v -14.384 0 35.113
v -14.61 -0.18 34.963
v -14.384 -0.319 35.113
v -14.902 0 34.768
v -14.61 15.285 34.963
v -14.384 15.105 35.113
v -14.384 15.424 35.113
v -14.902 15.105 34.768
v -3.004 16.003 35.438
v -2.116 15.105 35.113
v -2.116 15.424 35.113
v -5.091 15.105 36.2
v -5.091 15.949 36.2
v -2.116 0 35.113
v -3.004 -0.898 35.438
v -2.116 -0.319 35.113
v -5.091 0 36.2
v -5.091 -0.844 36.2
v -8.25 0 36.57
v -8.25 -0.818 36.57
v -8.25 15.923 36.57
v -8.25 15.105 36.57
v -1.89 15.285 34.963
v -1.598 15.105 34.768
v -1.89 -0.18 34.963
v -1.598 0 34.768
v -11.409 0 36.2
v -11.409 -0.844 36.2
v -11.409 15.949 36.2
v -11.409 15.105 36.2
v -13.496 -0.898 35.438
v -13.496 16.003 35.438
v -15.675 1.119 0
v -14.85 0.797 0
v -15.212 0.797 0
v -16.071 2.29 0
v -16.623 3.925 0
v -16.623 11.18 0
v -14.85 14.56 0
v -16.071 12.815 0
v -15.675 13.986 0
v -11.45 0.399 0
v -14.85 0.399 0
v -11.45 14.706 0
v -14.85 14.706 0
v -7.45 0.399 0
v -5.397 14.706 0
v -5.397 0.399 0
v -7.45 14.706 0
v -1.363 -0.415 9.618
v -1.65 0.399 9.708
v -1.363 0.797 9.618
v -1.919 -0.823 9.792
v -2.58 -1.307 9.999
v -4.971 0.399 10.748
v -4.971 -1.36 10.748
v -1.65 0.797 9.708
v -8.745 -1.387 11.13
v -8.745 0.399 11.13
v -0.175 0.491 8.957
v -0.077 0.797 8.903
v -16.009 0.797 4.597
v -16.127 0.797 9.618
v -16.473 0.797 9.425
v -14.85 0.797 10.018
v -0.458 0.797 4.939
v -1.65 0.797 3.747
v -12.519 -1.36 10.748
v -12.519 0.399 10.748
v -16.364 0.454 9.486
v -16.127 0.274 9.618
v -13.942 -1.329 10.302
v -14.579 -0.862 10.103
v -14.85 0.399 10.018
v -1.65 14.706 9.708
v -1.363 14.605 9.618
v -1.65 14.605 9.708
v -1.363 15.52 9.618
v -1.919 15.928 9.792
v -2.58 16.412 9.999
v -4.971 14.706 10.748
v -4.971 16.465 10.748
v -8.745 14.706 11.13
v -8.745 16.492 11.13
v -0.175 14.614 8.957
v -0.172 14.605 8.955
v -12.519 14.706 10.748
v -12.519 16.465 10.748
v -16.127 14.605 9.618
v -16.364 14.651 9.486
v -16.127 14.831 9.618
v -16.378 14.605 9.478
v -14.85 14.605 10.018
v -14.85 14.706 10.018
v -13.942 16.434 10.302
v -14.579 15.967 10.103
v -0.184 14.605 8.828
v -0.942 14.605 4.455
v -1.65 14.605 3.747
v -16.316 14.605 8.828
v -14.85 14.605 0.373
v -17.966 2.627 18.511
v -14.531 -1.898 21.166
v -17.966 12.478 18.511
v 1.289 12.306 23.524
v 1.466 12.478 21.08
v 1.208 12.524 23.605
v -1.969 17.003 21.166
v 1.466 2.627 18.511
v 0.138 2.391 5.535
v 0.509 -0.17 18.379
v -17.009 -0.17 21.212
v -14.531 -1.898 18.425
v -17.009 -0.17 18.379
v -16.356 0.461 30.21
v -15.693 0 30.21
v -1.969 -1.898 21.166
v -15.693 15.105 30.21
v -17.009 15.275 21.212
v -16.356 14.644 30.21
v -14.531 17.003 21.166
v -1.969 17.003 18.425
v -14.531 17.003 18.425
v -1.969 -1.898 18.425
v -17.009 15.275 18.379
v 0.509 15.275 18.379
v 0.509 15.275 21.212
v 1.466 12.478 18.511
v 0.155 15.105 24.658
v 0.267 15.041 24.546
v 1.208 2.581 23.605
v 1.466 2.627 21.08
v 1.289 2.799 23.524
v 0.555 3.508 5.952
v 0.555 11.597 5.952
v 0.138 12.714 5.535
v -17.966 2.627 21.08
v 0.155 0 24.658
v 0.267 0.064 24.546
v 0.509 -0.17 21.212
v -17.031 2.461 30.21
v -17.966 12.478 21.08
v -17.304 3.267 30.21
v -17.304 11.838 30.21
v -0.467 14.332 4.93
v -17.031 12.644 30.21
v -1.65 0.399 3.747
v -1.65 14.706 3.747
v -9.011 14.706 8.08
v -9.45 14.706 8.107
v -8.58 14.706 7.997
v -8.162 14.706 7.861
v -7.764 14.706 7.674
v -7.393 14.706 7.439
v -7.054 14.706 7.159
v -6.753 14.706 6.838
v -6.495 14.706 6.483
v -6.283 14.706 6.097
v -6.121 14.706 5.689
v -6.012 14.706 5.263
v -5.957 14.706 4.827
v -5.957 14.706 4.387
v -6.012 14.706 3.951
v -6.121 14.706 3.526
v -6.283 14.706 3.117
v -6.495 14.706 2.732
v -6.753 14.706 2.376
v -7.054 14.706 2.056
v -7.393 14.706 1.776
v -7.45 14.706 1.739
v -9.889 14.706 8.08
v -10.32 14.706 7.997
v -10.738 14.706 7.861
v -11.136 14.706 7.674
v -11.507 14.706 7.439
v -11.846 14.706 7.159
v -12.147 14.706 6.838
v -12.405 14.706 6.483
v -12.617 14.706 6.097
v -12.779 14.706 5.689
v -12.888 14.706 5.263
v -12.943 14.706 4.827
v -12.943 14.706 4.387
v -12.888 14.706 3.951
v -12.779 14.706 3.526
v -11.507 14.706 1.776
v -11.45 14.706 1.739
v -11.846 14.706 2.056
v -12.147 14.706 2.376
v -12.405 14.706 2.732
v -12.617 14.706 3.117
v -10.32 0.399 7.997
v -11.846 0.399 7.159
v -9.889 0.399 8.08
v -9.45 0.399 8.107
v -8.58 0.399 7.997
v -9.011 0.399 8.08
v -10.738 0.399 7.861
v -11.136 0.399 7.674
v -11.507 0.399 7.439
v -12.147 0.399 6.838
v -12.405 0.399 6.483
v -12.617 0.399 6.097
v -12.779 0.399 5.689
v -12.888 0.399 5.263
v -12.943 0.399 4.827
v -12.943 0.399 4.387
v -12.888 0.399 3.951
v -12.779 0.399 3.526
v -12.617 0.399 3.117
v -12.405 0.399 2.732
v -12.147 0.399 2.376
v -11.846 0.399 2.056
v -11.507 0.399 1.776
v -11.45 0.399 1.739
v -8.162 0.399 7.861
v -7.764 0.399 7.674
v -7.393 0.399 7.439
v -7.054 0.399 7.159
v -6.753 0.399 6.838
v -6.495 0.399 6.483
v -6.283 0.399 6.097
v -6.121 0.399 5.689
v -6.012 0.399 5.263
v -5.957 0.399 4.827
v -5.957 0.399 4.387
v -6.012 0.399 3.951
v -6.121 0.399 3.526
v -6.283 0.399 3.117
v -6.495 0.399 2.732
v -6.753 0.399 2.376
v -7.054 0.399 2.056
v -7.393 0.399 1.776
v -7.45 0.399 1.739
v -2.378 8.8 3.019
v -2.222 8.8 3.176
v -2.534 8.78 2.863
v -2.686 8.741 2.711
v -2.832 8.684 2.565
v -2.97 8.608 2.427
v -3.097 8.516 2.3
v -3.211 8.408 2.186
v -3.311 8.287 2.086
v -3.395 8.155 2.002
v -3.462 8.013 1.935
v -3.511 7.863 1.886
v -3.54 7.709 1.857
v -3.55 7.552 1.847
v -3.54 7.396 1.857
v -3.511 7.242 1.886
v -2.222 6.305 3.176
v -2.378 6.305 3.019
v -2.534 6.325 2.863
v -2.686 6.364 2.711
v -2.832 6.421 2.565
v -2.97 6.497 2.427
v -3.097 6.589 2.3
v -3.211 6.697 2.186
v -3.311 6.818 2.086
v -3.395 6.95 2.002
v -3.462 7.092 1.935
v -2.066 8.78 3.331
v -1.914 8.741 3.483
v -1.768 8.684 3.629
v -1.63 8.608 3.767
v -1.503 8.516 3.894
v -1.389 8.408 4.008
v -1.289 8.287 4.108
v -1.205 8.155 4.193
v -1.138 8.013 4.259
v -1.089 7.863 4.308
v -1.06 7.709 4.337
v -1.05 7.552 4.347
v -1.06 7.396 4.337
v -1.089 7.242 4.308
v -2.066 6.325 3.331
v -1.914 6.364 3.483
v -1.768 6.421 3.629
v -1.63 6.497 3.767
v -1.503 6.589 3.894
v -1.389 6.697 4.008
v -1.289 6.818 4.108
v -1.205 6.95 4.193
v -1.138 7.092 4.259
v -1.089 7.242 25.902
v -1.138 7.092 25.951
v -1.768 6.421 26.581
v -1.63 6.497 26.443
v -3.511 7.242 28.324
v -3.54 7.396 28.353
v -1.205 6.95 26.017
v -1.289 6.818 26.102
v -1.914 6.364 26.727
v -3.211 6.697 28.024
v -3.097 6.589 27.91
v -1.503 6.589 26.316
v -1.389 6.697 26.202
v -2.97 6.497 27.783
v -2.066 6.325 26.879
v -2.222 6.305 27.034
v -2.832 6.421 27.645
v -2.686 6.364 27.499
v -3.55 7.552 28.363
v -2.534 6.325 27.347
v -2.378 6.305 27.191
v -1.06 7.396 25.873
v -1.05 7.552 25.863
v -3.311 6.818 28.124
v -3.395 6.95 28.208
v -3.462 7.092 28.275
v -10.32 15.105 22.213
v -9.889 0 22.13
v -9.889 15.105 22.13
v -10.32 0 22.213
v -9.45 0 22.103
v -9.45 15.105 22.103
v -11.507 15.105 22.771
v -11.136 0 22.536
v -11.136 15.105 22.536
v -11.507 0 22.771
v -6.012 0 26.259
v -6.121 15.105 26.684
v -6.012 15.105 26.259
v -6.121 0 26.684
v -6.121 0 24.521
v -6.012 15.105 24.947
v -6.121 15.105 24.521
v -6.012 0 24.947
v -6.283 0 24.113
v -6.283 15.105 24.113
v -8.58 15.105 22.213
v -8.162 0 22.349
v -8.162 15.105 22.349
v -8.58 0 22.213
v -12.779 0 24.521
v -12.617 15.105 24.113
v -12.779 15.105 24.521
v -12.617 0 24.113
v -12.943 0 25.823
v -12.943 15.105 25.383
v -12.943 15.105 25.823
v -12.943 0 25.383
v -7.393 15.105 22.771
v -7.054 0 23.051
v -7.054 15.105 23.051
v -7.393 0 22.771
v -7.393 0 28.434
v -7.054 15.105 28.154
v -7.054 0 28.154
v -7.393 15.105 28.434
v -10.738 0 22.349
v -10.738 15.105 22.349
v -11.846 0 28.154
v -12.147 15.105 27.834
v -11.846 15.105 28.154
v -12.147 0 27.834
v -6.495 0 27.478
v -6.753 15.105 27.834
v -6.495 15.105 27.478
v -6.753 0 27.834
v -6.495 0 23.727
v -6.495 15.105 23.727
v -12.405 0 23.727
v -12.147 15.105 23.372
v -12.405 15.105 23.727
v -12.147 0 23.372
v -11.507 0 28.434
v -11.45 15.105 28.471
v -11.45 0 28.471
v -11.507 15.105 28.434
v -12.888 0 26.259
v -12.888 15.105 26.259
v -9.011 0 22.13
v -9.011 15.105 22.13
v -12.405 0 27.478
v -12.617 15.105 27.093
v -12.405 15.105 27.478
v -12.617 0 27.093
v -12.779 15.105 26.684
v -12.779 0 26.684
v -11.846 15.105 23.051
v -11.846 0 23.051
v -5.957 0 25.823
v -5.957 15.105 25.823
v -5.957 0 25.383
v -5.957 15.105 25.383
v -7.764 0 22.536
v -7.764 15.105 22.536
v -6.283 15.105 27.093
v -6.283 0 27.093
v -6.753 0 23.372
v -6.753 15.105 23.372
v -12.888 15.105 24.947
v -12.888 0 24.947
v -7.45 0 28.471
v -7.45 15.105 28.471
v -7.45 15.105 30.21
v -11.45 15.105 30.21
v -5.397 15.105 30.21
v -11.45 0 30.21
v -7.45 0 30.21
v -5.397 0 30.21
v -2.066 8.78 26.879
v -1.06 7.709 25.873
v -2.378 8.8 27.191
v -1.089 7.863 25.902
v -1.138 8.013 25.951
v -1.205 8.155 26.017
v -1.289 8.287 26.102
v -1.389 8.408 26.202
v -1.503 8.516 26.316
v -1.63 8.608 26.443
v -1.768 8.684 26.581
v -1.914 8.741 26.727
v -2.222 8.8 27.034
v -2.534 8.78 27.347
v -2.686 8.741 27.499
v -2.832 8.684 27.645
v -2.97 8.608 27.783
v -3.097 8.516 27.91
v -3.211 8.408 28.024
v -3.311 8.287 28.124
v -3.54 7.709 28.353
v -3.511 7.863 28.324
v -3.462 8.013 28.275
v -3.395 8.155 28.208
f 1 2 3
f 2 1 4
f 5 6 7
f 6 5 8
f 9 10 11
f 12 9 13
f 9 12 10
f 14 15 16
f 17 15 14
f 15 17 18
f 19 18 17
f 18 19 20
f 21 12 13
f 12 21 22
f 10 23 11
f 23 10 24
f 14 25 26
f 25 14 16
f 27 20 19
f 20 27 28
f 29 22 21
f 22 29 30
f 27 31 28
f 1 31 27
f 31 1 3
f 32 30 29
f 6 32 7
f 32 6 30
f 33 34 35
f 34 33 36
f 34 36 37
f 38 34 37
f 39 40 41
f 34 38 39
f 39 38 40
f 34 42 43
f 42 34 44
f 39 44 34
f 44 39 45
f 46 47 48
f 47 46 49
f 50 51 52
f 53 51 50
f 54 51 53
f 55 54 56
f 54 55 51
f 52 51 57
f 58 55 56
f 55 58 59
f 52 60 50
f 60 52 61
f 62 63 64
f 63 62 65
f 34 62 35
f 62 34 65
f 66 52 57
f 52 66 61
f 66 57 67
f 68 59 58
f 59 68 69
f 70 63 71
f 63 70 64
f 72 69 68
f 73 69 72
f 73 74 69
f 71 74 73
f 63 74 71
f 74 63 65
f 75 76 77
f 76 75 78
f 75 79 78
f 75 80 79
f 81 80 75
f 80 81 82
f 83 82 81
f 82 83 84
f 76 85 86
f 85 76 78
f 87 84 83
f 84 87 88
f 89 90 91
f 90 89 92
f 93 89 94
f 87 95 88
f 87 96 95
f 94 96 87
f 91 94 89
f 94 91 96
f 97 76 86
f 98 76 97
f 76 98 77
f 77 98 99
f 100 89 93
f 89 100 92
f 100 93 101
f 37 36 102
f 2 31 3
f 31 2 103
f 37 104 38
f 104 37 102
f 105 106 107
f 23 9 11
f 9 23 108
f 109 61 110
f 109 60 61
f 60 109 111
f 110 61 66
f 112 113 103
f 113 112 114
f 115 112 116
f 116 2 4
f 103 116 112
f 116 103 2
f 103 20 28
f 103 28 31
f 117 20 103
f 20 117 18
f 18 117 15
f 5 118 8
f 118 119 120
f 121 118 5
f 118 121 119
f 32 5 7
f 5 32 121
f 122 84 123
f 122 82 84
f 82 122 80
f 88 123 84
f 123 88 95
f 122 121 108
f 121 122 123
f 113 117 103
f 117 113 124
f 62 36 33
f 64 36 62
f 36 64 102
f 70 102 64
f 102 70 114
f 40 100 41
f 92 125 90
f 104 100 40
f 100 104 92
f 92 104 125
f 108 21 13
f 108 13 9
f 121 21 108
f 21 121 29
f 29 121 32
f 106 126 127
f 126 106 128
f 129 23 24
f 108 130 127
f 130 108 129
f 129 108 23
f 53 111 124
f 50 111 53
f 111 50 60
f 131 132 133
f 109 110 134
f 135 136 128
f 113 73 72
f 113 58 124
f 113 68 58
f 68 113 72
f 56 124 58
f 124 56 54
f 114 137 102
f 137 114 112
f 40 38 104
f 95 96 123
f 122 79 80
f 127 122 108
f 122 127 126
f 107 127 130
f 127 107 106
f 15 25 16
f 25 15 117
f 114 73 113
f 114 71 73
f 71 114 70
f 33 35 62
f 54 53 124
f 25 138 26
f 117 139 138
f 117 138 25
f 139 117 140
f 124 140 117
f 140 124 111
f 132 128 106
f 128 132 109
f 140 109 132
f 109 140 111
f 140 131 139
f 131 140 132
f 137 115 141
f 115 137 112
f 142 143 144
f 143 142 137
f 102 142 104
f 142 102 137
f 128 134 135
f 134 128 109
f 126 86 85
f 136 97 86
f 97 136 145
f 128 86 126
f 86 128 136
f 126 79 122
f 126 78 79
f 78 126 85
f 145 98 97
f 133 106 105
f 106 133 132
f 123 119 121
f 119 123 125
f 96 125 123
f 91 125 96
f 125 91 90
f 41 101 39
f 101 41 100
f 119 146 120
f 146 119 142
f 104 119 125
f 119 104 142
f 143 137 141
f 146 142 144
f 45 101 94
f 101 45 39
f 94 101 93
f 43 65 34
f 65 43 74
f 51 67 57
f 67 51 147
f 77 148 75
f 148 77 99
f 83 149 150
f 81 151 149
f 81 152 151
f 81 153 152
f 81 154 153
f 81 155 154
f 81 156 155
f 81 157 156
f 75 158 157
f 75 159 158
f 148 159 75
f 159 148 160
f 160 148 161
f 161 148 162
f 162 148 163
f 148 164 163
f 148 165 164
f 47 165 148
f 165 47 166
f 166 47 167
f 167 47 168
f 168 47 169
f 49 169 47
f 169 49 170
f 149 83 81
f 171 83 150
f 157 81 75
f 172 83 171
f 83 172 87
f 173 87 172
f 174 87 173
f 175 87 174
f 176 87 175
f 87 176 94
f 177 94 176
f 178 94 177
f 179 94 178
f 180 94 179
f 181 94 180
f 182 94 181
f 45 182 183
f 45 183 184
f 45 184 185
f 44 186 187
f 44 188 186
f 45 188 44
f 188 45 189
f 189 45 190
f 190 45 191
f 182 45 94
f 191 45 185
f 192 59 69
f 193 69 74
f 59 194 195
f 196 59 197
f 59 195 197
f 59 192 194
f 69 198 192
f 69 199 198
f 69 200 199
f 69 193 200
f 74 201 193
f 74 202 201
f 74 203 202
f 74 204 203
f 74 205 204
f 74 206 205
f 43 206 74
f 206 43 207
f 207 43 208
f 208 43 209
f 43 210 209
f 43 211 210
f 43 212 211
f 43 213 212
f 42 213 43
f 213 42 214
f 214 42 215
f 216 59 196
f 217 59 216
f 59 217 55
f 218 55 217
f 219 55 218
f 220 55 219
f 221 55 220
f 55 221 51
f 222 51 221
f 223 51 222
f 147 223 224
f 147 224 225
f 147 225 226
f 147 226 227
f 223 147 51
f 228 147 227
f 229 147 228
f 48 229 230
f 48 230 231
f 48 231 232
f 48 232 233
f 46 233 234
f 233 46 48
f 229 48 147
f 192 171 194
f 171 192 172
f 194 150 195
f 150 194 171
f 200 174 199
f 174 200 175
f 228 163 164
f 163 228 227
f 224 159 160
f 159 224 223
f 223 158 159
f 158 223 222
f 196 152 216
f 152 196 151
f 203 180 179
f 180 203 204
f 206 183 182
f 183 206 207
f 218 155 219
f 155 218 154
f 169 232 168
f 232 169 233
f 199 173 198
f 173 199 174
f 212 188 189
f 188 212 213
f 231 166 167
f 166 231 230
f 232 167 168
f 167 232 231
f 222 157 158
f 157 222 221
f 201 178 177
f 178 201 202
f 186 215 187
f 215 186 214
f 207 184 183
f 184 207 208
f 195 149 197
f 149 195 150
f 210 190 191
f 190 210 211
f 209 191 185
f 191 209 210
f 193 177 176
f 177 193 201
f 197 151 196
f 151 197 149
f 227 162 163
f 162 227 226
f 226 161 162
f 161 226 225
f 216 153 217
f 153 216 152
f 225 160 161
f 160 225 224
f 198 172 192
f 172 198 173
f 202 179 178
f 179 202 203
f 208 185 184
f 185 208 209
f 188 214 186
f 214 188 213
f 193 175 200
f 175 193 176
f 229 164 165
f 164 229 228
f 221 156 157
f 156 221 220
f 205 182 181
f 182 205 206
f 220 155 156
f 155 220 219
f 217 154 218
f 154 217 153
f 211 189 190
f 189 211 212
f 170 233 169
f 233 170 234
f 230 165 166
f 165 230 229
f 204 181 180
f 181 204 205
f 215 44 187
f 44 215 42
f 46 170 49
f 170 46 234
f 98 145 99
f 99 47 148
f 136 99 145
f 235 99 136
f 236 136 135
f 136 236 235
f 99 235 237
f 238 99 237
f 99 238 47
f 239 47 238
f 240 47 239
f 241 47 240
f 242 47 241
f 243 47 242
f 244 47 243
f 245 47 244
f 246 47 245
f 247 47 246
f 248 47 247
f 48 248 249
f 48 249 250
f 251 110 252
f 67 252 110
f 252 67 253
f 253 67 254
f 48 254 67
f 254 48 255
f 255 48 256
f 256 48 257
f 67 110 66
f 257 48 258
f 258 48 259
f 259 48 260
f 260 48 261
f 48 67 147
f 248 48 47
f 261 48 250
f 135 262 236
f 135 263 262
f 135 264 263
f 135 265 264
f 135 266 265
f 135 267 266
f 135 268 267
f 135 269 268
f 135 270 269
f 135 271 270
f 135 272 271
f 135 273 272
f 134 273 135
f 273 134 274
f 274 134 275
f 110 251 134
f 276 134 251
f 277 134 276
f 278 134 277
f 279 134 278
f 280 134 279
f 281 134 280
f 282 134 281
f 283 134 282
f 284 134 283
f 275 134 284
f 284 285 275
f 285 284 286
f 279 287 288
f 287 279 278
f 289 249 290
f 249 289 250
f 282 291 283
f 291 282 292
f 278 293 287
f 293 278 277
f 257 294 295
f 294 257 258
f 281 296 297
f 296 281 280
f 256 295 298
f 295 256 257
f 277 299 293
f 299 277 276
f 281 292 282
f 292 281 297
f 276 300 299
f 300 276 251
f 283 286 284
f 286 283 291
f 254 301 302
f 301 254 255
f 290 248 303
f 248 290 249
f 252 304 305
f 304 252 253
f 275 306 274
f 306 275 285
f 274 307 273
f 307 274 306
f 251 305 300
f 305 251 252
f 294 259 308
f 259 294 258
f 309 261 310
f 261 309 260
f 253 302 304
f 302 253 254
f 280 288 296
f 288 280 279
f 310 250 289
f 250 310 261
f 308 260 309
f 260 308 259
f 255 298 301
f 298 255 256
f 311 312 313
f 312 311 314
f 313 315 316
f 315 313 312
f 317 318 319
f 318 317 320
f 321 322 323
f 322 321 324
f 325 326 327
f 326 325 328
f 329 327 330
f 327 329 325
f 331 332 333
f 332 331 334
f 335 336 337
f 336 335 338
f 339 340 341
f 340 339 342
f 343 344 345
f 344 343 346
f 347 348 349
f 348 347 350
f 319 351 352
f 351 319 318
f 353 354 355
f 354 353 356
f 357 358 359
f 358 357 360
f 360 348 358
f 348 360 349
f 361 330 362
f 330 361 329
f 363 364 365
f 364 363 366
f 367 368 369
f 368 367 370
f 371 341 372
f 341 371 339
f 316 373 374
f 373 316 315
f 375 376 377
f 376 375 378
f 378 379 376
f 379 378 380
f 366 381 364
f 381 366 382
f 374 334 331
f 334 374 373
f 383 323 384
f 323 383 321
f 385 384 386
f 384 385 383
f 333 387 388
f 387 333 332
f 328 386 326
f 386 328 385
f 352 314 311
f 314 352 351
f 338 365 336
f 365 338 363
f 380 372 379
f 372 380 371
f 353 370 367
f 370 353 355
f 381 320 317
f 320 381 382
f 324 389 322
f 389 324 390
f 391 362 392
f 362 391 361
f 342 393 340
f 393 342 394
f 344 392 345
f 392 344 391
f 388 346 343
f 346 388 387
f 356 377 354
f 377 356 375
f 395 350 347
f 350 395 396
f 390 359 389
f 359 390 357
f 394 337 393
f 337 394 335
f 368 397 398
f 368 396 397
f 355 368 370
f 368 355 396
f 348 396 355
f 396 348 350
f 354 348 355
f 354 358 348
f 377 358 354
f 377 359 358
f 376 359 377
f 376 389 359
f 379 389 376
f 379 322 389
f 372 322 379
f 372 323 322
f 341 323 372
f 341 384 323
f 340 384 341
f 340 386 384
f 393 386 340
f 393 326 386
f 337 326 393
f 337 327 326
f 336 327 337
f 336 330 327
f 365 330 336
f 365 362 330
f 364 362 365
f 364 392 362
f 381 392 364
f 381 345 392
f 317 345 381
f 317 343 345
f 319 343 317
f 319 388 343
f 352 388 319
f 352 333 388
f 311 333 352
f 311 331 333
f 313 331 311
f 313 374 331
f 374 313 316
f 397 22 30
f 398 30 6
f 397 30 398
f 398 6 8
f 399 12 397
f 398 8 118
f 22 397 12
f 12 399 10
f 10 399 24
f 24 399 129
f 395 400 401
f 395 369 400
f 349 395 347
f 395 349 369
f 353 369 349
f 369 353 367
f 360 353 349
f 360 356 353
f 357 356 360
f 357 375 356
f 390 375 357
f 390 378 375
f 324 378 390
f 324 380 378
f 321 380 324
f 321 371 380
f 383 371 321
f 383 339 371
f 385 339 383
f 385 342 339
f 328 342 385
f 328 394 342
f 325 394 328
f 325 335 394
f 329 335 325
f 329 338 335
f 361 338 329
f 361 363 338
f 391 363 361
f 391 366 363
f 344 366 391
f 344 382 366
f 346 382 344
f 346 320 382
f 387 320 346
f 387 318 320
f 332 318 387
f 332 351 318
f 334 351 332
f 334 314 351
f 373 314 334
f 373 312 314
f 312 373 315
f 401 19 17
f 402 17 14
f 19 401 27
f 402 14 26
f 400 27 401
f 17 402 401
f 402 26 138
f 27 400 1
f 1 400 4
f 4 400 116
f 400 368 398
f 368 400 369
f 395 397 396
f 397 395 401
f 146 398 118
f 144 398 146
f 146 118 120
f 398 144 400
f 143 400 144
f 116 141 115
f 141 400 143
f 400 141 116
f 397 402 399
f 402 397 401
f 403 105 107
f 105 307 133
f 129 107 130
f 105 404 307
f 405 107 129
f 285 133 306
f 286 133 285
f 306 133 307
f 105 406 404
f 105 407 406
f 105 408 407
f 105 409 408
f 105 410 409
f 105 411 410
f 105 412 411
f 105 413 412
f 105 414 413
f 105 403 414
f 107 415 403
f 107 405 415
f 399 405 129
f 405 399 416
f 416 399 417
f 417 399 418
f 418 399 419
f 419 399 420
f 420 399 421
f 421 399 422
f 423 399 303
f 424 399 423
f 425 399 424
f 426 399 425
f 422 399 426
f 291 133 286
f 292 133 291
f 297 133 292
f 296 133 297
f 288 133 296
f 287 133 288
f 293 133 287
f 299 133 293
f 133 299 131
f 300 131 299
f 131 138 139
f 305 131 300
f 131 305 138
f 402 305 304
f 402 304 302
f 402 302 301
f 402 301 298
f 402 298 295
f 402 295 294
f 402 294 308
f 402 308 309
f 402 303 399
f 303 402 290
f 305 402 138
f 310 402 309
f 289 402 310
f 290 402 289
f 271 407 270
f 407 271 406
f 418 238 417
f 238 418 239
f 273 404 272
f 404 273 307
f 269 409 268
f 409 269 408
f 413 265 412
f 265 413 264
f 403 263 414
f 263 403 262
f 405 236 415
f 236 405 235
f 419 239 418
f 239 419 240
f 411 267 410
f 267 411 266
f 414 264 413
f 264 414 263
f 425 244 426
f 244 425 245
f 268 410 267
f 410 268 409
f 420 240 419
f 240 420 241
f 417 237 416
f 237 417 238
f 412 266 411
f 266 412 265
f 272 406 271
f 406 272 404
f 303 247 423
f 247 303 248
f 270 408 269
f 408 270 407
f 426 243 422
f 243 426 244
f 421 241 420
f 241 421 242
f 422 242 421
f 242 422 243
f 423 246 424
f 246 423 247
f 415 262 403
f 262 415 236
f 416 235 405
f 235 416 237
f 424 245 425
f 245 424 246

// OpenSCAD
// file: finger_mid.scad
include <../config.scad>
use <finger_base.scad>

rotate([0,-90,0]) fingermid();

//	Middle segment of finger, can be lengthened
module fingermid(length=19, proximalHole=true, distalHole=true)
{
	difference() {
		scale([yScaleFactor,xScaleFactor,zScaleFactor]) {
			fingerbasesolid(length);
		}
		if(proximalHole) {
			translate([0,knucklePadding/2 * xScaleFactor,0]) fingerhardwarecutouts(jointDia, jointThick, knuckleW=knuckleW-knucklePadding, fingerLen=length);
		}
		if(distalHole) {
			translate([length * yScaleFactor,0,0]) mirror([1,0,0]) fingerhardwarecutouts(jointDia, jointThick, knuckleW=knuckleW, fingerLen=length);
		}
	}
}
// file: finger_base.scad
include <../config.scad>

//rotate([0,-90,0]) fingerbase();

/**
 * Proximal phalanx for all digits (fingers and thumb) - rendered from parts/finger_base.scad
 * @id finger_base
 * @name Finger Base
 * @category Printed
 */

//	Base segment of finger, can be lengthened
module fingerbase(length=23, proximalHole=true, distalHole=true)
{
	difference() {
		scale([yScaleFactor,xScaleFactor,zScaleFactor]) {
			fingerbasesolid(length);
		}
		if(proximalHole) {
			translate([0,knucklePadding/2 * xScaleFactor,0]) fingerhardwarecutouts(jointDia, jointThick, knuckleW=knuckleW-knucklePadding, fingerLen=length);
		}
		if (distalHole) {
			translate([length * yScaleFactor,0,0]) mirror([1,0,0]) fingerhardwarecutouts(jointDia, jointThick, knuckleW=knuckleW, fingerLen=length);
		}
	}


	
}

module fingerhardwarecutouts(jointDia,jointThick,knuckleW,fingerLen,holeCutoff=100) {
	//slot for flex joint
	translate([7 - (15/jointDia),0,6*zScaleFactor - (1.8/jointThick)]) {
		rotate([90,0,0]) translate([-0.25,0,-knuckleW*xScaleFactor]) cylinder(d=jointDia, h=knuckleW*xScaleFactor, $fn=50);
		translate([-25,(knuckleW*xScaleFactor) / 2,0]) cube([50,knuckleW*xScaleFactor,jointThick], center=true);
	}
	//cubic parts
	translate([-100,0,0]) cube([100,knuckleW*xScaleFactor,100]);
	translate([-5.5*yScaleFactor,0,0]) rotate([0,45,0]) translate([-50,0,0]) cube([100,knuckleW * xScaleFactor, 10]);

	//channel for string/tendon
	translate([-fingerLen/2 * yScaleFactor, knuckleW/2 * xScaleFactor, 2.3]) rotate([0,90,0]) cylinder(d=2.5, h=holeCutoff, $fn=50);
}

//	base segment of finger, solid
module fingerbasesolid(length=50, cutout=true) {
	difference() {
		//cubic part
		translate([0,0.001 + knucklePadding/2,1]) cube([length, knuckleW - knucklePadding - 0.002, 8]);
	}
	
	//cylindrical-ish part around finger
	intersection() {
		//overly large shape to get the cross section in the XZ plane from
		difference() {
			union() {
				translate([length-4,-5,5]) rotate([-90,0,0]) cylinder(r=8,h=knuckleW + 10);
				translate([0,-5,-5]) cube([length,knuckleW + 10,20]);
			}
			//cutout for the side "guards" of the previous knuckle
			if(cutout) {
				translate([-4,-knuckleW+0.001,5.3]) rotate([-90,0,0]) cylinder(r=11,h=10);
				translate([-4,knuckleW - knucklePadding*(1/xScaleFactor),5.3]) rotate([-90,0,0]) cylinder(r=11,h=10);
			}
		}

		hull() {
			for(i=[-1,1], j=[-1,1]) {
				//angled cylinders to provide the outer shape of the finger
				translate([length/10,i*2.4 + knuckleW/2,j*2.2 + 5]) rotate([i*j*-4,j*86,0]) cylinder(d=6,h=20,center=true);
				translate([length+4, i*2.4 + knuckleW/2, j*2.2 + 5]) rotate([i*j*-4,j*-86,0]) cylinder(d=6,h=20,center=true);
			}
		}
	}
}
// file: finger_tip.scad
include <../config.scad>
include <finger_base.scad>
include <finger_mid.scad>

//rotate([0,-90,0]) fingertip_curved_solid(pad=fingerPads);

/**
 * Distal phalanx of fingers - rendered from parts/finger_tip.scad
 * @id finger_tip
 * @name Finger Tip
 * @category Printed
 */

module fingertip_curved_solid(length=17, pad=true, hole=true) {
//	if (!pad)
//		fingertip(length=length);
//	else {
		render() difference() {
			union() {
				fingermid(length=length+3, proximalHole=true, distalHole=false);
				translate([length*yScaleFactor,0,1.5*zScaleFactor]) rotate([0,30,0]) fingertip(length=length, proximalHole=false, cutout=false);
			}
			//hole for string
			if(hole) translate([0,xScaleFactor * knuckleW/2,2]) rotate([0,90,0]) cylinder(d=2.5,h=100, $fn=50);
			//hollow for soft pad
			if(pad) translate([length*yScaleFactor,0,1.5*zScaleFactor]) rotate([0,30,0]) fingertip_pad(length);
		}
//	}
}

module fingertip_solid(length=15, pad=true) {
	if (!pad)
		fingertip(length=length);
	else {
		render() difference() {
			fingertip(length=length);
			if(pad) fingertip_pad(length);
		}
	}
}

module fingertip_pad(length) {
	difference() {
		fingertip(length,pad=false, proximalHole=false, cutout=false);
		translate([0,-10,-10]) cube([length-7,50,50]);
		translate([0,0.2*xScaleFactor,4.5]) cube([length+5,xScaleFactor * (knuckleW - knucklePadding),8]);
		translate([0,xScaleFactor * knuckleW/2,0]) {
			rotate([0,60,0]) cylinder(d=8, h=100);
		}
	}
}

//	tip segment of finger, can be lengthened
module fingertip(length=15, proximalHole=true, cutout=true)
{
	intersection() {
		difference() {
			scale([yScaleFactor,xScaleFactor,zScaleFactor]) {
				fingerbasesolid(length,cutout);
			}
			if(proximalHole) {
				translate([0,knucklePadding/2 * xScaleFactor,0]) fingerhardwarecutouts(jointDia, jointThick, knuckleW=knuckleW-knucklePadding, fingerLen=length, holeCutoff=(length-0.5)*2);
				translate([(length - 5) * yScaleFactor,(knuckleW/2) * xScaleFactor,0])
					rotate([0,30,0]) translate([0,0,2]) cylinder(d=2.5, h=100, $fn=50);
			}
		}
		translate([(length-10)*xScaleFactor,0,21*zScaleFactor]) rotate([-90,0,0]) cylinder(d=70, h=100, center=true);
	}
}
// file: ../config.scad
/**
 * Configuration settings for Flexy Beast, required to generate correctly sized STLs of the printed parts. See the Configuration File Assembly instructions to set this up.
 * @id config_file
 * @name Configuration File
 * @category Prerequisites!
 * @step Open config.scad in your favorite text editor.
 * @step As per the normal Cyborg Beast instructions, measure the width of the knuckles in the non-affected hand and convert to millimeters.
 * @step Add 5 to that result and then divide by 55.
 * @step Replace the x-, y-, and zScaleFactor variables in config.scad with that number.
 * @step If desired, adjust the proportions of the hand by changing those variables individually. xScaleFactor controls the width of the hand, yScaleFactor controls the length, and zScaleFactor controls the height.
 * @step Open assembly.scad in OpenSCAD to check that the flexy joint holes are not too large for the hand (should only be necessary for small children). If necessary, reduce the jointDia and jointThick variables. jointDia=5 and jointThick=2 is a good amount for smaller hands.
 * @step Set the fingerPads variable to true or false depending on whether you want to cast silicone finger pads for improved grip.
 * @step Open palm.scad, finger_base.scad, finger_tip.scad, and thumb_tip.scad in OpenSCAD, render each part (F6), and export as STL, then print. Suggested print settings are 0.2mm or smaller layer height, 3 perimeters, and 25% rectilinear or hexagonal infill.
 */

knuckleR = 4.85;
knucklePadding = 0.5;
knuckleW = 9.5;
wristH = 10;
palmH = 20;
palmW = 64;
th = 3;
fn = 32;

//flexy joint parameters
jointDia = 7;
jointThick = 4;

//finger pad settings
fingerPads = true; //whether or not to hollow the finger tips slightly for molding pads

//desired scale factor for hand based on the standard Cyborg Beast/Robohand sizing guide
xScaleFactor = 1.59; // [1.05:1.60]
yScaleFactor = 1.59; // [1.05:1.60]
zScaleFactor = 1.65; // [1.05:1.60]
// main file
include <../config.scad>
include <finger_tip.scad>

//fingertip_mold();

/**
 * Mold for casting silicone finger tip grip - rendered from parts/finger_tip_mold.scad
 * @id finger_tip_mold
 * @name Finger Tip Mold
 * @category Printed
 */

module fingertip_mold(length=15) {
	difference() {
		scale([xScaleFactor,zScaleFactor,yScaleFactor]) {
			cube([knuckleW + knucklePadding + 10, 18, 20]);
		}
		scale([1.05,1.05,1.05]) translate([knuckleW + knucklePadding + 10,2,35]) rotate([0,80,90]) fingertip(length, proximalHole=false, cutout=false);
	}
}
